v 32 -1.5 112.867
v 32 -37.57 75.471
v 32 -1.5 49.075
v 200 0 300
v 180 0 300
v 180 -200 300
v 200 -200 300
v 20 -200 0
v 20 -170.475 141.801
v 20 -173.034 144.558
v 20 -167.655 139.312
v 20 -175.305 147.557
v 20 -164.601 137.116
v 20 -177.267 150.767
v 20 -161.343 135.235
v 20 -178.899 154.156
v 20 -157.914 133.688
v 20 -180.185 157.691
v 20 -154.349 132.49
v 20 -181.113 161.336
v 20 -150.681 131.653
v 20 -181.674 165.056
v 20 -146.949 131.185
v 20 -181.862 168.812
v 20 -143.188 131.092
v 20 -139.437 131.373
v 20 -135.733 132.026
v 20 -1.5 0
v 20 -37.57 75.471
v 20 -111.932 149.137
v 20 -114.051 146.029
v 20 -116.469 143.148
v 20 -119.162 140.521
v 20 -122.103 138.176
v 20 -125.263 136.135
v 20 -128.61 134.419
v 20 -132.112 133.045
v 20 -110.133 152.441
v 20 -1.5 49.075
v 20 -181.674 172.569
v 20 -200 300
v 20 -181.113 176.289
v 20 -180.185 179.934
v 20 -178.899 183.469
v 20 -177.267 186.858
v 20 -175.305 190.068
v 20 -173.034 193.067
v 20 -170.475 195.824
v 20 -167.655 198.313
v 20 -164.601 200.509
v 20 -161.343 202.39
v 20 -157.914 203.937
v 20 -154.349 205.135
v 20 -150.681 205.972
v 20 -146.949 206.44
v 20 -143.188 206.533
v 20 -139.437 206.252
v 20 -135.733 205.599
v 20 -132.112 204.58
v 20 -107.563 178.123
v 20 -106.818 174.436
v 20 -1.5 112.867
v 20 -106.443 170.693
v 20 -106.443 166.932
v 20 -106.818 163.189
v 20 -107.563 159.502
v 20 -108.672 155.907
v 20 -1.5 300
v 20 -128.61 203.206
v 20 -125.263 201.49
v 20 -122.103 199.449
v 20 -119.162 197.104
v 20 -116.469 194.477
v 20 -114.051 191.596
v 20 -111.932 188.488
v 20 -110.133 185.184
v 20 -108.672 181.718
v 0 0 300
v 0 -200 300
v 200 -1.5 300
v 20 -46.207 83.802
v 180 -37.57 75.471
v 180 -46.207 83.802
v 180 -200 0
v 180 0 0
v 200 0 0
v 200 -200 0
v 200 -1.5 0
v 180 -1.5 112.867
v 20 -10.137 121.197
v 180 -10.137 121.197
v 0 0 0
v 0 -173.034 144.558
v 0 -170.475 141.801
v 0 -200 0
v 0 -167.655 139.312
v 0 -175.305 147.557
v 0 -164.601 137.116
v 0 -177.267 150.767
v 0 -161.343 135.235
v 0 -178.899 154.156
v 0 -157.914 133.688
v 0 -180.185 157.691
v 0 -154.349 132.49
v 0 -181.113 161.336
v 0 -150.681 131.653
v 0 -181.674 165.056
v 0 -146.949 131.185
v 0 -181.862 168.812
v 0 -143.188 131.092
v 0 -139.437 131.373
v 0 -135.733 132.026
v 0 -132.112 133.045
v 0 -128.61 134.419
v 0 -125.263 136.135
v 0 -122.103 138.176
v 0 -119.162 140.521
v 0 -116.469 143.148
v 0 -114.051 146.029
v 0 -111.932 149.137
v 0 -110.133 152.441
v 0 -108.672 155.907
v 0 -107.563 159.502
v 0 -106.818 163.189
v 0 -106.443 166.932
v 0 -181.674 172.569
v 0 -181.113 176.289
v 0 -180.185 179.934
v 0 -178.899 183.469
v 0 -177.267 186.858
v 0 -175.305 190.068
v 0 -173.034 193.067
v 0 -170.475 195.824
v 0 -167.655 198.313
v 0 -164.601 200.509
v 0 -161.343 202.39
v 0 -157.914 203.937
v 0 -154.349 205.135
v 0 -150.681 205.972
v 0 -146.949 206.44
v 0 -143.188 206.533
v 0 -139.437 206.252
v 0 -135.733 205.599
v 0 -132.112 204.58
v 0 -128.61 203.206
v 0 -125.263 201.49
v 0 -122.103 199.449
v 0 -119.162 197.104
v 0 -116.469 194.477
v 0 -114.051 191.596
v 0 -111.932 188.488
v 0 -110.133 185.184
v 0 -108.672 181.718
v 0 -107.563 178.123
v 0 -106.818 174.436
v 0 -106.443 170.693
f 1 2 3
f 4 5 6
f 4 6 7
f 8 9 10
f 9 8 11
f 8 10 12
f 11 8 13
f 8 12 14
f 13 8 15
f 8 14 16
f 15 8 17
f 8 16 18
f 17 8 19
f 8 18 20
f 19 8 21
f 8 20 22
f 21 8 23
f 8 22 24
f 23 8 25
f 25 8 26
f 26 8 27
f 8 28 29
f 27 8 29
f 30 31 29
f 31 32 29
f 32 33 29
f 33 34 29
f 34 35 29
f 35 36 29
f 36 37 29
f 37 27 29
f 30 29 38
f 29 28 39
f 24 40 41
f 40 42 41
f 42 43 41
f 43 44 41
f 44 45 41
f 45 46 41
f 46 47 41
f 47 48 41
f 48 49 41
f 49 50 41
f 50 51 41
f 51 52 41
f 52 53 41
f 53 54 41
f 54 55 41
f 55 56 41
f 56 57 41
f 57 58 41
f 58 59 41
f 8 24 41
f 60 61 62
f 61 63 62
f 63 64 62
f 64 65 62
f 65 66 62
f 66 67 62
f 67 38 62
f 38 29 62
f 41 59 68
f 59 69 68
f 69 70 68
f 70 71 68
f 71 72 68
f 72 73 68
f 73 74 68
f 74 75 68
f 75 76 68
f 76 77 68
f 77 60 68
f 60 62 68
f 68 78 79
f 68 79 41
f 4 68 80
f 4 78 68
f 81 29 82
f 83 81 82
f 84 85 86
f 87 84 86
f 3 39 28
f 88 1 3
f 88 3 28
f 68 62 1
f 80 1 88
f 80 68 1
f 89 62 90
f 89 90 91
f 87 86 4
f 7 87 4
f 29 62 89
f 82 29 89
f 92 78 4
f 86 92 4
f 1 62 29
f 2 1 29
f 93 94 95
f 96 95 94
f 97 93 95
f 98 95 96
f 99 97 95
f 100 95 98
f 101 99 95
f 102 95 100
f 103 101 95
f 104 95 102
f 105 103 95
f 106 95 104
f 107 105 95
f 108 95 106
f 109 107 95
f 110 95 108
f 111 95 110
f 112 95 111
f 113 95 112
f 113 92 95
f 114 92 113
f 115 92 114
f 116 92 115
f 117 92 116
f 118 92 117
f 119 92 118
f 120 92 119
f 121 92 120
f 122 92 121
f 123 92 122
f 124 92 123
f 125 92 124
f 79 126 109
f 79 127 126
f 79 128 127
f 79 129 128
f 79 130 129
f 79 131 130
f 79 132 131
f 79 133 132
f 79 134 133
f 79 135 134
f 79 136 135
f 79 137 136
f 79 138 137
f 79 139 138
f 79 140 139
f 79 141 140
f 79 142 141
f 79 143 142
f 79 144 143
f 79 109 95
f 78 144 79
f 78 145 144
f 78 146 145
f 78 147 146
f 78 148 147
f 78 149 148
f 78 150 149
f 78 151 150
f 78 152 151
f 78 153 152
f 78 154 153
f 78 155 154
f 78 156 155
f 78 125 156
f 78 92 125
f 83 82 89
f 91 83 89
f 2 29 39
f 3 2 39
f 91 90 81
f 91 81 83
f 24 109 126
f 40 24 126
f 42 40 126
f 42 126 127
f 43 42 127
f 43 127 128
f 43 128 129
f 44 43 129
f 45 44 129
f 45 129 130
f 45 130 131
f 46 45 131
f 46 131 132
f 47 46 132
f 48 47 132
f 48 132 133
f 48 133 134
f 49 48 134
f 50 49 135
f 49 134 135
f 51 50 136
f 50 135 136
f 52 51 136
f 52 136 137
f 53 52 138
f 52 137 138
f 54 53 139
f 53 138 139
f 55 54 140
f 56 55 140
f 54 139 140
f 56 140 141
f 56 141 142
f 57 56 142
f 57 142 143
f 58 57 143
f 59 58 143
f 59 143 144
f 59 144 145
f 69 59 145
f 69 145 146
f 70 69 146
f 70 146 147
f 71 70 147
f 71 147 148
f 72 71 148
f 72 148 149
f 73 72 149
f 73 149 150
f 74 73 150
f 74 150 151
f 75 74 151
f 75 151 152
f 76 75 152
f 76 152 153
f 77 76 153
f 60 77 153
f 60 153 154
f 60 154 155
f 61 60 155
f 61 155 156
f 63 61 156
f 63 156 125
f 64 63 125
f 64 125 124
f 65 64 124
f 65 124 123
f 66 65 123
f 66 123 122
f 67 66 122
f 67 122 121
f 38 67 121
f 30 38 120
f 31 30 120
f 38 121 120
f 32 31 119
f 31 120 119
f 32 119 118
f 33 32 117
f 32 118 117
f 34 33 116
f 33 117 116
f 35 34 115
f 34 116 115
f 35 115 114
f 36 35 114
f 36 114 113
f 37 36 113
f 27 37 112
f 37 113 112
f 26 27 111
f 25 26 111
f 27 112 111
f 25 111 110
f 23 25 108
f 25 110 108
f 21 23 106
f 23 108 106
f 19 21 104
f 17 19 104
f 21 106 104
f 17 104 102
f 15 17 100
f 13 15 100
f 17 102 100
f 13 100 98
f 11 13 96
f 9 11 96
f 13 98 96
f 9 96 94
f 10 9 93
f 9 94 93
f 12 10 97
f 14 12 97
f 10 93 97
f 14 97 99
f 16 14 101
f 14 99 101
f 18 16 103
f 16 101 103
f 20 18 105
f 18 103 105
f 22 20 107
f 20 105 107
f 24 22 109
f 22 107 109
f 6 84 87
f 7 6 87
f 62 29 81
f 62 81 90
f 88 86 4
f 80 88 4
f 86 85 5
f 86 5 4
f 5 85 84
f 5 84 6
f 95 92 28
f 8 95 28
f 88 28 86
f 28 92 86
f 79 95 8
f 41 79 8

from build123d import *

# Parameters (mm, degrees)
F0_W      = 200
F0_H      = 300
F1_DEPTH  = 1.5
F2_W      = 20
F2_H      = 300
F3_DEPTH  = 200
F5_DEPTH  = 12
F6_W      = 160
F6_H      = 51.9561140742
F7_DEPTH  = 12
F8_W      = 20
F8_H      = 300
F9_DEPTH  = 200
F10_R     = 43.6696111293
F11_DEPTH = 30
F12_R     = 37.7325868248
F13_DEPTH = 25


with BuildPart() as f1:
    # F0 (on Front) → F1 (new body)
    with BuildSketch(Plane.XZ):
        with Locations((100, 150)):
            Rectangle(F0_W, F0_H)
    extrude(amount=F1_DEPTH)

    # F2 (on Front) → F3 (join)
    with BuildSketch(Plane.XZ):
        with Locations((10, 150)):
            Rectangle(F2_W, F2_H)
    extrude(amount=F3_DEPTH)

    # F4 (on face) → F5 (join)
    with BuildSketch(Plane.YZ.offset(20)):
        Polygon((-1.5, 112.8666251898), (-37.5698320568, 75.4713714123), (-1.5, 49.0747205913), align=None)
    extrude(amount=F5_DEPTH)

    # F10 (on face) → F11 (cut)
    with BuildSketch(Plane.YZ.offset(200)):
        with Locations((-115.351036191, 228.2001972198)):
            Circle(F10_R)
    extrude(amount=F11_DEPTH, mode=Mode.SUBTRACT)

    # F12 (on face) → F13 (cut)
    with BuildSketch(Plane(origin=(0, 0, 0), x_dir=(0, -1, 0), z_dir=(-1, 0, 0))):
        with Locations((144.1290527582, 168.8124984503)):
            Circle(F12_R)
    extrude(amount=-F13_DEPTH, mode=Mode.SUBTRACT)


with BuildPart() as f7:
    # F6 (on face) → F7 (new body)
    with BuildSketch(Plane(origin=(0, -57.1736403414, 55.1472017667), x_dir=(1, 0, 0), z_dir=(0, -0.7197469334, 0.6942365244))):
        with Locations((100, 54.2159955426)):
            Rectangle(F6_W, F6_H)
    extrude(amount=F7_DEPTH)


with BuildPart() as f9:
    # F8 (on Front) → F9 (new body)
    with BuildSketch(Plane.XZ):
        with Locations((190, 150)):
            Rectangle(F8_W, F8_H)
    extrude(amount=F9_DEPTH)


solid = Compound([f1.part, f7.part, f9.part])
